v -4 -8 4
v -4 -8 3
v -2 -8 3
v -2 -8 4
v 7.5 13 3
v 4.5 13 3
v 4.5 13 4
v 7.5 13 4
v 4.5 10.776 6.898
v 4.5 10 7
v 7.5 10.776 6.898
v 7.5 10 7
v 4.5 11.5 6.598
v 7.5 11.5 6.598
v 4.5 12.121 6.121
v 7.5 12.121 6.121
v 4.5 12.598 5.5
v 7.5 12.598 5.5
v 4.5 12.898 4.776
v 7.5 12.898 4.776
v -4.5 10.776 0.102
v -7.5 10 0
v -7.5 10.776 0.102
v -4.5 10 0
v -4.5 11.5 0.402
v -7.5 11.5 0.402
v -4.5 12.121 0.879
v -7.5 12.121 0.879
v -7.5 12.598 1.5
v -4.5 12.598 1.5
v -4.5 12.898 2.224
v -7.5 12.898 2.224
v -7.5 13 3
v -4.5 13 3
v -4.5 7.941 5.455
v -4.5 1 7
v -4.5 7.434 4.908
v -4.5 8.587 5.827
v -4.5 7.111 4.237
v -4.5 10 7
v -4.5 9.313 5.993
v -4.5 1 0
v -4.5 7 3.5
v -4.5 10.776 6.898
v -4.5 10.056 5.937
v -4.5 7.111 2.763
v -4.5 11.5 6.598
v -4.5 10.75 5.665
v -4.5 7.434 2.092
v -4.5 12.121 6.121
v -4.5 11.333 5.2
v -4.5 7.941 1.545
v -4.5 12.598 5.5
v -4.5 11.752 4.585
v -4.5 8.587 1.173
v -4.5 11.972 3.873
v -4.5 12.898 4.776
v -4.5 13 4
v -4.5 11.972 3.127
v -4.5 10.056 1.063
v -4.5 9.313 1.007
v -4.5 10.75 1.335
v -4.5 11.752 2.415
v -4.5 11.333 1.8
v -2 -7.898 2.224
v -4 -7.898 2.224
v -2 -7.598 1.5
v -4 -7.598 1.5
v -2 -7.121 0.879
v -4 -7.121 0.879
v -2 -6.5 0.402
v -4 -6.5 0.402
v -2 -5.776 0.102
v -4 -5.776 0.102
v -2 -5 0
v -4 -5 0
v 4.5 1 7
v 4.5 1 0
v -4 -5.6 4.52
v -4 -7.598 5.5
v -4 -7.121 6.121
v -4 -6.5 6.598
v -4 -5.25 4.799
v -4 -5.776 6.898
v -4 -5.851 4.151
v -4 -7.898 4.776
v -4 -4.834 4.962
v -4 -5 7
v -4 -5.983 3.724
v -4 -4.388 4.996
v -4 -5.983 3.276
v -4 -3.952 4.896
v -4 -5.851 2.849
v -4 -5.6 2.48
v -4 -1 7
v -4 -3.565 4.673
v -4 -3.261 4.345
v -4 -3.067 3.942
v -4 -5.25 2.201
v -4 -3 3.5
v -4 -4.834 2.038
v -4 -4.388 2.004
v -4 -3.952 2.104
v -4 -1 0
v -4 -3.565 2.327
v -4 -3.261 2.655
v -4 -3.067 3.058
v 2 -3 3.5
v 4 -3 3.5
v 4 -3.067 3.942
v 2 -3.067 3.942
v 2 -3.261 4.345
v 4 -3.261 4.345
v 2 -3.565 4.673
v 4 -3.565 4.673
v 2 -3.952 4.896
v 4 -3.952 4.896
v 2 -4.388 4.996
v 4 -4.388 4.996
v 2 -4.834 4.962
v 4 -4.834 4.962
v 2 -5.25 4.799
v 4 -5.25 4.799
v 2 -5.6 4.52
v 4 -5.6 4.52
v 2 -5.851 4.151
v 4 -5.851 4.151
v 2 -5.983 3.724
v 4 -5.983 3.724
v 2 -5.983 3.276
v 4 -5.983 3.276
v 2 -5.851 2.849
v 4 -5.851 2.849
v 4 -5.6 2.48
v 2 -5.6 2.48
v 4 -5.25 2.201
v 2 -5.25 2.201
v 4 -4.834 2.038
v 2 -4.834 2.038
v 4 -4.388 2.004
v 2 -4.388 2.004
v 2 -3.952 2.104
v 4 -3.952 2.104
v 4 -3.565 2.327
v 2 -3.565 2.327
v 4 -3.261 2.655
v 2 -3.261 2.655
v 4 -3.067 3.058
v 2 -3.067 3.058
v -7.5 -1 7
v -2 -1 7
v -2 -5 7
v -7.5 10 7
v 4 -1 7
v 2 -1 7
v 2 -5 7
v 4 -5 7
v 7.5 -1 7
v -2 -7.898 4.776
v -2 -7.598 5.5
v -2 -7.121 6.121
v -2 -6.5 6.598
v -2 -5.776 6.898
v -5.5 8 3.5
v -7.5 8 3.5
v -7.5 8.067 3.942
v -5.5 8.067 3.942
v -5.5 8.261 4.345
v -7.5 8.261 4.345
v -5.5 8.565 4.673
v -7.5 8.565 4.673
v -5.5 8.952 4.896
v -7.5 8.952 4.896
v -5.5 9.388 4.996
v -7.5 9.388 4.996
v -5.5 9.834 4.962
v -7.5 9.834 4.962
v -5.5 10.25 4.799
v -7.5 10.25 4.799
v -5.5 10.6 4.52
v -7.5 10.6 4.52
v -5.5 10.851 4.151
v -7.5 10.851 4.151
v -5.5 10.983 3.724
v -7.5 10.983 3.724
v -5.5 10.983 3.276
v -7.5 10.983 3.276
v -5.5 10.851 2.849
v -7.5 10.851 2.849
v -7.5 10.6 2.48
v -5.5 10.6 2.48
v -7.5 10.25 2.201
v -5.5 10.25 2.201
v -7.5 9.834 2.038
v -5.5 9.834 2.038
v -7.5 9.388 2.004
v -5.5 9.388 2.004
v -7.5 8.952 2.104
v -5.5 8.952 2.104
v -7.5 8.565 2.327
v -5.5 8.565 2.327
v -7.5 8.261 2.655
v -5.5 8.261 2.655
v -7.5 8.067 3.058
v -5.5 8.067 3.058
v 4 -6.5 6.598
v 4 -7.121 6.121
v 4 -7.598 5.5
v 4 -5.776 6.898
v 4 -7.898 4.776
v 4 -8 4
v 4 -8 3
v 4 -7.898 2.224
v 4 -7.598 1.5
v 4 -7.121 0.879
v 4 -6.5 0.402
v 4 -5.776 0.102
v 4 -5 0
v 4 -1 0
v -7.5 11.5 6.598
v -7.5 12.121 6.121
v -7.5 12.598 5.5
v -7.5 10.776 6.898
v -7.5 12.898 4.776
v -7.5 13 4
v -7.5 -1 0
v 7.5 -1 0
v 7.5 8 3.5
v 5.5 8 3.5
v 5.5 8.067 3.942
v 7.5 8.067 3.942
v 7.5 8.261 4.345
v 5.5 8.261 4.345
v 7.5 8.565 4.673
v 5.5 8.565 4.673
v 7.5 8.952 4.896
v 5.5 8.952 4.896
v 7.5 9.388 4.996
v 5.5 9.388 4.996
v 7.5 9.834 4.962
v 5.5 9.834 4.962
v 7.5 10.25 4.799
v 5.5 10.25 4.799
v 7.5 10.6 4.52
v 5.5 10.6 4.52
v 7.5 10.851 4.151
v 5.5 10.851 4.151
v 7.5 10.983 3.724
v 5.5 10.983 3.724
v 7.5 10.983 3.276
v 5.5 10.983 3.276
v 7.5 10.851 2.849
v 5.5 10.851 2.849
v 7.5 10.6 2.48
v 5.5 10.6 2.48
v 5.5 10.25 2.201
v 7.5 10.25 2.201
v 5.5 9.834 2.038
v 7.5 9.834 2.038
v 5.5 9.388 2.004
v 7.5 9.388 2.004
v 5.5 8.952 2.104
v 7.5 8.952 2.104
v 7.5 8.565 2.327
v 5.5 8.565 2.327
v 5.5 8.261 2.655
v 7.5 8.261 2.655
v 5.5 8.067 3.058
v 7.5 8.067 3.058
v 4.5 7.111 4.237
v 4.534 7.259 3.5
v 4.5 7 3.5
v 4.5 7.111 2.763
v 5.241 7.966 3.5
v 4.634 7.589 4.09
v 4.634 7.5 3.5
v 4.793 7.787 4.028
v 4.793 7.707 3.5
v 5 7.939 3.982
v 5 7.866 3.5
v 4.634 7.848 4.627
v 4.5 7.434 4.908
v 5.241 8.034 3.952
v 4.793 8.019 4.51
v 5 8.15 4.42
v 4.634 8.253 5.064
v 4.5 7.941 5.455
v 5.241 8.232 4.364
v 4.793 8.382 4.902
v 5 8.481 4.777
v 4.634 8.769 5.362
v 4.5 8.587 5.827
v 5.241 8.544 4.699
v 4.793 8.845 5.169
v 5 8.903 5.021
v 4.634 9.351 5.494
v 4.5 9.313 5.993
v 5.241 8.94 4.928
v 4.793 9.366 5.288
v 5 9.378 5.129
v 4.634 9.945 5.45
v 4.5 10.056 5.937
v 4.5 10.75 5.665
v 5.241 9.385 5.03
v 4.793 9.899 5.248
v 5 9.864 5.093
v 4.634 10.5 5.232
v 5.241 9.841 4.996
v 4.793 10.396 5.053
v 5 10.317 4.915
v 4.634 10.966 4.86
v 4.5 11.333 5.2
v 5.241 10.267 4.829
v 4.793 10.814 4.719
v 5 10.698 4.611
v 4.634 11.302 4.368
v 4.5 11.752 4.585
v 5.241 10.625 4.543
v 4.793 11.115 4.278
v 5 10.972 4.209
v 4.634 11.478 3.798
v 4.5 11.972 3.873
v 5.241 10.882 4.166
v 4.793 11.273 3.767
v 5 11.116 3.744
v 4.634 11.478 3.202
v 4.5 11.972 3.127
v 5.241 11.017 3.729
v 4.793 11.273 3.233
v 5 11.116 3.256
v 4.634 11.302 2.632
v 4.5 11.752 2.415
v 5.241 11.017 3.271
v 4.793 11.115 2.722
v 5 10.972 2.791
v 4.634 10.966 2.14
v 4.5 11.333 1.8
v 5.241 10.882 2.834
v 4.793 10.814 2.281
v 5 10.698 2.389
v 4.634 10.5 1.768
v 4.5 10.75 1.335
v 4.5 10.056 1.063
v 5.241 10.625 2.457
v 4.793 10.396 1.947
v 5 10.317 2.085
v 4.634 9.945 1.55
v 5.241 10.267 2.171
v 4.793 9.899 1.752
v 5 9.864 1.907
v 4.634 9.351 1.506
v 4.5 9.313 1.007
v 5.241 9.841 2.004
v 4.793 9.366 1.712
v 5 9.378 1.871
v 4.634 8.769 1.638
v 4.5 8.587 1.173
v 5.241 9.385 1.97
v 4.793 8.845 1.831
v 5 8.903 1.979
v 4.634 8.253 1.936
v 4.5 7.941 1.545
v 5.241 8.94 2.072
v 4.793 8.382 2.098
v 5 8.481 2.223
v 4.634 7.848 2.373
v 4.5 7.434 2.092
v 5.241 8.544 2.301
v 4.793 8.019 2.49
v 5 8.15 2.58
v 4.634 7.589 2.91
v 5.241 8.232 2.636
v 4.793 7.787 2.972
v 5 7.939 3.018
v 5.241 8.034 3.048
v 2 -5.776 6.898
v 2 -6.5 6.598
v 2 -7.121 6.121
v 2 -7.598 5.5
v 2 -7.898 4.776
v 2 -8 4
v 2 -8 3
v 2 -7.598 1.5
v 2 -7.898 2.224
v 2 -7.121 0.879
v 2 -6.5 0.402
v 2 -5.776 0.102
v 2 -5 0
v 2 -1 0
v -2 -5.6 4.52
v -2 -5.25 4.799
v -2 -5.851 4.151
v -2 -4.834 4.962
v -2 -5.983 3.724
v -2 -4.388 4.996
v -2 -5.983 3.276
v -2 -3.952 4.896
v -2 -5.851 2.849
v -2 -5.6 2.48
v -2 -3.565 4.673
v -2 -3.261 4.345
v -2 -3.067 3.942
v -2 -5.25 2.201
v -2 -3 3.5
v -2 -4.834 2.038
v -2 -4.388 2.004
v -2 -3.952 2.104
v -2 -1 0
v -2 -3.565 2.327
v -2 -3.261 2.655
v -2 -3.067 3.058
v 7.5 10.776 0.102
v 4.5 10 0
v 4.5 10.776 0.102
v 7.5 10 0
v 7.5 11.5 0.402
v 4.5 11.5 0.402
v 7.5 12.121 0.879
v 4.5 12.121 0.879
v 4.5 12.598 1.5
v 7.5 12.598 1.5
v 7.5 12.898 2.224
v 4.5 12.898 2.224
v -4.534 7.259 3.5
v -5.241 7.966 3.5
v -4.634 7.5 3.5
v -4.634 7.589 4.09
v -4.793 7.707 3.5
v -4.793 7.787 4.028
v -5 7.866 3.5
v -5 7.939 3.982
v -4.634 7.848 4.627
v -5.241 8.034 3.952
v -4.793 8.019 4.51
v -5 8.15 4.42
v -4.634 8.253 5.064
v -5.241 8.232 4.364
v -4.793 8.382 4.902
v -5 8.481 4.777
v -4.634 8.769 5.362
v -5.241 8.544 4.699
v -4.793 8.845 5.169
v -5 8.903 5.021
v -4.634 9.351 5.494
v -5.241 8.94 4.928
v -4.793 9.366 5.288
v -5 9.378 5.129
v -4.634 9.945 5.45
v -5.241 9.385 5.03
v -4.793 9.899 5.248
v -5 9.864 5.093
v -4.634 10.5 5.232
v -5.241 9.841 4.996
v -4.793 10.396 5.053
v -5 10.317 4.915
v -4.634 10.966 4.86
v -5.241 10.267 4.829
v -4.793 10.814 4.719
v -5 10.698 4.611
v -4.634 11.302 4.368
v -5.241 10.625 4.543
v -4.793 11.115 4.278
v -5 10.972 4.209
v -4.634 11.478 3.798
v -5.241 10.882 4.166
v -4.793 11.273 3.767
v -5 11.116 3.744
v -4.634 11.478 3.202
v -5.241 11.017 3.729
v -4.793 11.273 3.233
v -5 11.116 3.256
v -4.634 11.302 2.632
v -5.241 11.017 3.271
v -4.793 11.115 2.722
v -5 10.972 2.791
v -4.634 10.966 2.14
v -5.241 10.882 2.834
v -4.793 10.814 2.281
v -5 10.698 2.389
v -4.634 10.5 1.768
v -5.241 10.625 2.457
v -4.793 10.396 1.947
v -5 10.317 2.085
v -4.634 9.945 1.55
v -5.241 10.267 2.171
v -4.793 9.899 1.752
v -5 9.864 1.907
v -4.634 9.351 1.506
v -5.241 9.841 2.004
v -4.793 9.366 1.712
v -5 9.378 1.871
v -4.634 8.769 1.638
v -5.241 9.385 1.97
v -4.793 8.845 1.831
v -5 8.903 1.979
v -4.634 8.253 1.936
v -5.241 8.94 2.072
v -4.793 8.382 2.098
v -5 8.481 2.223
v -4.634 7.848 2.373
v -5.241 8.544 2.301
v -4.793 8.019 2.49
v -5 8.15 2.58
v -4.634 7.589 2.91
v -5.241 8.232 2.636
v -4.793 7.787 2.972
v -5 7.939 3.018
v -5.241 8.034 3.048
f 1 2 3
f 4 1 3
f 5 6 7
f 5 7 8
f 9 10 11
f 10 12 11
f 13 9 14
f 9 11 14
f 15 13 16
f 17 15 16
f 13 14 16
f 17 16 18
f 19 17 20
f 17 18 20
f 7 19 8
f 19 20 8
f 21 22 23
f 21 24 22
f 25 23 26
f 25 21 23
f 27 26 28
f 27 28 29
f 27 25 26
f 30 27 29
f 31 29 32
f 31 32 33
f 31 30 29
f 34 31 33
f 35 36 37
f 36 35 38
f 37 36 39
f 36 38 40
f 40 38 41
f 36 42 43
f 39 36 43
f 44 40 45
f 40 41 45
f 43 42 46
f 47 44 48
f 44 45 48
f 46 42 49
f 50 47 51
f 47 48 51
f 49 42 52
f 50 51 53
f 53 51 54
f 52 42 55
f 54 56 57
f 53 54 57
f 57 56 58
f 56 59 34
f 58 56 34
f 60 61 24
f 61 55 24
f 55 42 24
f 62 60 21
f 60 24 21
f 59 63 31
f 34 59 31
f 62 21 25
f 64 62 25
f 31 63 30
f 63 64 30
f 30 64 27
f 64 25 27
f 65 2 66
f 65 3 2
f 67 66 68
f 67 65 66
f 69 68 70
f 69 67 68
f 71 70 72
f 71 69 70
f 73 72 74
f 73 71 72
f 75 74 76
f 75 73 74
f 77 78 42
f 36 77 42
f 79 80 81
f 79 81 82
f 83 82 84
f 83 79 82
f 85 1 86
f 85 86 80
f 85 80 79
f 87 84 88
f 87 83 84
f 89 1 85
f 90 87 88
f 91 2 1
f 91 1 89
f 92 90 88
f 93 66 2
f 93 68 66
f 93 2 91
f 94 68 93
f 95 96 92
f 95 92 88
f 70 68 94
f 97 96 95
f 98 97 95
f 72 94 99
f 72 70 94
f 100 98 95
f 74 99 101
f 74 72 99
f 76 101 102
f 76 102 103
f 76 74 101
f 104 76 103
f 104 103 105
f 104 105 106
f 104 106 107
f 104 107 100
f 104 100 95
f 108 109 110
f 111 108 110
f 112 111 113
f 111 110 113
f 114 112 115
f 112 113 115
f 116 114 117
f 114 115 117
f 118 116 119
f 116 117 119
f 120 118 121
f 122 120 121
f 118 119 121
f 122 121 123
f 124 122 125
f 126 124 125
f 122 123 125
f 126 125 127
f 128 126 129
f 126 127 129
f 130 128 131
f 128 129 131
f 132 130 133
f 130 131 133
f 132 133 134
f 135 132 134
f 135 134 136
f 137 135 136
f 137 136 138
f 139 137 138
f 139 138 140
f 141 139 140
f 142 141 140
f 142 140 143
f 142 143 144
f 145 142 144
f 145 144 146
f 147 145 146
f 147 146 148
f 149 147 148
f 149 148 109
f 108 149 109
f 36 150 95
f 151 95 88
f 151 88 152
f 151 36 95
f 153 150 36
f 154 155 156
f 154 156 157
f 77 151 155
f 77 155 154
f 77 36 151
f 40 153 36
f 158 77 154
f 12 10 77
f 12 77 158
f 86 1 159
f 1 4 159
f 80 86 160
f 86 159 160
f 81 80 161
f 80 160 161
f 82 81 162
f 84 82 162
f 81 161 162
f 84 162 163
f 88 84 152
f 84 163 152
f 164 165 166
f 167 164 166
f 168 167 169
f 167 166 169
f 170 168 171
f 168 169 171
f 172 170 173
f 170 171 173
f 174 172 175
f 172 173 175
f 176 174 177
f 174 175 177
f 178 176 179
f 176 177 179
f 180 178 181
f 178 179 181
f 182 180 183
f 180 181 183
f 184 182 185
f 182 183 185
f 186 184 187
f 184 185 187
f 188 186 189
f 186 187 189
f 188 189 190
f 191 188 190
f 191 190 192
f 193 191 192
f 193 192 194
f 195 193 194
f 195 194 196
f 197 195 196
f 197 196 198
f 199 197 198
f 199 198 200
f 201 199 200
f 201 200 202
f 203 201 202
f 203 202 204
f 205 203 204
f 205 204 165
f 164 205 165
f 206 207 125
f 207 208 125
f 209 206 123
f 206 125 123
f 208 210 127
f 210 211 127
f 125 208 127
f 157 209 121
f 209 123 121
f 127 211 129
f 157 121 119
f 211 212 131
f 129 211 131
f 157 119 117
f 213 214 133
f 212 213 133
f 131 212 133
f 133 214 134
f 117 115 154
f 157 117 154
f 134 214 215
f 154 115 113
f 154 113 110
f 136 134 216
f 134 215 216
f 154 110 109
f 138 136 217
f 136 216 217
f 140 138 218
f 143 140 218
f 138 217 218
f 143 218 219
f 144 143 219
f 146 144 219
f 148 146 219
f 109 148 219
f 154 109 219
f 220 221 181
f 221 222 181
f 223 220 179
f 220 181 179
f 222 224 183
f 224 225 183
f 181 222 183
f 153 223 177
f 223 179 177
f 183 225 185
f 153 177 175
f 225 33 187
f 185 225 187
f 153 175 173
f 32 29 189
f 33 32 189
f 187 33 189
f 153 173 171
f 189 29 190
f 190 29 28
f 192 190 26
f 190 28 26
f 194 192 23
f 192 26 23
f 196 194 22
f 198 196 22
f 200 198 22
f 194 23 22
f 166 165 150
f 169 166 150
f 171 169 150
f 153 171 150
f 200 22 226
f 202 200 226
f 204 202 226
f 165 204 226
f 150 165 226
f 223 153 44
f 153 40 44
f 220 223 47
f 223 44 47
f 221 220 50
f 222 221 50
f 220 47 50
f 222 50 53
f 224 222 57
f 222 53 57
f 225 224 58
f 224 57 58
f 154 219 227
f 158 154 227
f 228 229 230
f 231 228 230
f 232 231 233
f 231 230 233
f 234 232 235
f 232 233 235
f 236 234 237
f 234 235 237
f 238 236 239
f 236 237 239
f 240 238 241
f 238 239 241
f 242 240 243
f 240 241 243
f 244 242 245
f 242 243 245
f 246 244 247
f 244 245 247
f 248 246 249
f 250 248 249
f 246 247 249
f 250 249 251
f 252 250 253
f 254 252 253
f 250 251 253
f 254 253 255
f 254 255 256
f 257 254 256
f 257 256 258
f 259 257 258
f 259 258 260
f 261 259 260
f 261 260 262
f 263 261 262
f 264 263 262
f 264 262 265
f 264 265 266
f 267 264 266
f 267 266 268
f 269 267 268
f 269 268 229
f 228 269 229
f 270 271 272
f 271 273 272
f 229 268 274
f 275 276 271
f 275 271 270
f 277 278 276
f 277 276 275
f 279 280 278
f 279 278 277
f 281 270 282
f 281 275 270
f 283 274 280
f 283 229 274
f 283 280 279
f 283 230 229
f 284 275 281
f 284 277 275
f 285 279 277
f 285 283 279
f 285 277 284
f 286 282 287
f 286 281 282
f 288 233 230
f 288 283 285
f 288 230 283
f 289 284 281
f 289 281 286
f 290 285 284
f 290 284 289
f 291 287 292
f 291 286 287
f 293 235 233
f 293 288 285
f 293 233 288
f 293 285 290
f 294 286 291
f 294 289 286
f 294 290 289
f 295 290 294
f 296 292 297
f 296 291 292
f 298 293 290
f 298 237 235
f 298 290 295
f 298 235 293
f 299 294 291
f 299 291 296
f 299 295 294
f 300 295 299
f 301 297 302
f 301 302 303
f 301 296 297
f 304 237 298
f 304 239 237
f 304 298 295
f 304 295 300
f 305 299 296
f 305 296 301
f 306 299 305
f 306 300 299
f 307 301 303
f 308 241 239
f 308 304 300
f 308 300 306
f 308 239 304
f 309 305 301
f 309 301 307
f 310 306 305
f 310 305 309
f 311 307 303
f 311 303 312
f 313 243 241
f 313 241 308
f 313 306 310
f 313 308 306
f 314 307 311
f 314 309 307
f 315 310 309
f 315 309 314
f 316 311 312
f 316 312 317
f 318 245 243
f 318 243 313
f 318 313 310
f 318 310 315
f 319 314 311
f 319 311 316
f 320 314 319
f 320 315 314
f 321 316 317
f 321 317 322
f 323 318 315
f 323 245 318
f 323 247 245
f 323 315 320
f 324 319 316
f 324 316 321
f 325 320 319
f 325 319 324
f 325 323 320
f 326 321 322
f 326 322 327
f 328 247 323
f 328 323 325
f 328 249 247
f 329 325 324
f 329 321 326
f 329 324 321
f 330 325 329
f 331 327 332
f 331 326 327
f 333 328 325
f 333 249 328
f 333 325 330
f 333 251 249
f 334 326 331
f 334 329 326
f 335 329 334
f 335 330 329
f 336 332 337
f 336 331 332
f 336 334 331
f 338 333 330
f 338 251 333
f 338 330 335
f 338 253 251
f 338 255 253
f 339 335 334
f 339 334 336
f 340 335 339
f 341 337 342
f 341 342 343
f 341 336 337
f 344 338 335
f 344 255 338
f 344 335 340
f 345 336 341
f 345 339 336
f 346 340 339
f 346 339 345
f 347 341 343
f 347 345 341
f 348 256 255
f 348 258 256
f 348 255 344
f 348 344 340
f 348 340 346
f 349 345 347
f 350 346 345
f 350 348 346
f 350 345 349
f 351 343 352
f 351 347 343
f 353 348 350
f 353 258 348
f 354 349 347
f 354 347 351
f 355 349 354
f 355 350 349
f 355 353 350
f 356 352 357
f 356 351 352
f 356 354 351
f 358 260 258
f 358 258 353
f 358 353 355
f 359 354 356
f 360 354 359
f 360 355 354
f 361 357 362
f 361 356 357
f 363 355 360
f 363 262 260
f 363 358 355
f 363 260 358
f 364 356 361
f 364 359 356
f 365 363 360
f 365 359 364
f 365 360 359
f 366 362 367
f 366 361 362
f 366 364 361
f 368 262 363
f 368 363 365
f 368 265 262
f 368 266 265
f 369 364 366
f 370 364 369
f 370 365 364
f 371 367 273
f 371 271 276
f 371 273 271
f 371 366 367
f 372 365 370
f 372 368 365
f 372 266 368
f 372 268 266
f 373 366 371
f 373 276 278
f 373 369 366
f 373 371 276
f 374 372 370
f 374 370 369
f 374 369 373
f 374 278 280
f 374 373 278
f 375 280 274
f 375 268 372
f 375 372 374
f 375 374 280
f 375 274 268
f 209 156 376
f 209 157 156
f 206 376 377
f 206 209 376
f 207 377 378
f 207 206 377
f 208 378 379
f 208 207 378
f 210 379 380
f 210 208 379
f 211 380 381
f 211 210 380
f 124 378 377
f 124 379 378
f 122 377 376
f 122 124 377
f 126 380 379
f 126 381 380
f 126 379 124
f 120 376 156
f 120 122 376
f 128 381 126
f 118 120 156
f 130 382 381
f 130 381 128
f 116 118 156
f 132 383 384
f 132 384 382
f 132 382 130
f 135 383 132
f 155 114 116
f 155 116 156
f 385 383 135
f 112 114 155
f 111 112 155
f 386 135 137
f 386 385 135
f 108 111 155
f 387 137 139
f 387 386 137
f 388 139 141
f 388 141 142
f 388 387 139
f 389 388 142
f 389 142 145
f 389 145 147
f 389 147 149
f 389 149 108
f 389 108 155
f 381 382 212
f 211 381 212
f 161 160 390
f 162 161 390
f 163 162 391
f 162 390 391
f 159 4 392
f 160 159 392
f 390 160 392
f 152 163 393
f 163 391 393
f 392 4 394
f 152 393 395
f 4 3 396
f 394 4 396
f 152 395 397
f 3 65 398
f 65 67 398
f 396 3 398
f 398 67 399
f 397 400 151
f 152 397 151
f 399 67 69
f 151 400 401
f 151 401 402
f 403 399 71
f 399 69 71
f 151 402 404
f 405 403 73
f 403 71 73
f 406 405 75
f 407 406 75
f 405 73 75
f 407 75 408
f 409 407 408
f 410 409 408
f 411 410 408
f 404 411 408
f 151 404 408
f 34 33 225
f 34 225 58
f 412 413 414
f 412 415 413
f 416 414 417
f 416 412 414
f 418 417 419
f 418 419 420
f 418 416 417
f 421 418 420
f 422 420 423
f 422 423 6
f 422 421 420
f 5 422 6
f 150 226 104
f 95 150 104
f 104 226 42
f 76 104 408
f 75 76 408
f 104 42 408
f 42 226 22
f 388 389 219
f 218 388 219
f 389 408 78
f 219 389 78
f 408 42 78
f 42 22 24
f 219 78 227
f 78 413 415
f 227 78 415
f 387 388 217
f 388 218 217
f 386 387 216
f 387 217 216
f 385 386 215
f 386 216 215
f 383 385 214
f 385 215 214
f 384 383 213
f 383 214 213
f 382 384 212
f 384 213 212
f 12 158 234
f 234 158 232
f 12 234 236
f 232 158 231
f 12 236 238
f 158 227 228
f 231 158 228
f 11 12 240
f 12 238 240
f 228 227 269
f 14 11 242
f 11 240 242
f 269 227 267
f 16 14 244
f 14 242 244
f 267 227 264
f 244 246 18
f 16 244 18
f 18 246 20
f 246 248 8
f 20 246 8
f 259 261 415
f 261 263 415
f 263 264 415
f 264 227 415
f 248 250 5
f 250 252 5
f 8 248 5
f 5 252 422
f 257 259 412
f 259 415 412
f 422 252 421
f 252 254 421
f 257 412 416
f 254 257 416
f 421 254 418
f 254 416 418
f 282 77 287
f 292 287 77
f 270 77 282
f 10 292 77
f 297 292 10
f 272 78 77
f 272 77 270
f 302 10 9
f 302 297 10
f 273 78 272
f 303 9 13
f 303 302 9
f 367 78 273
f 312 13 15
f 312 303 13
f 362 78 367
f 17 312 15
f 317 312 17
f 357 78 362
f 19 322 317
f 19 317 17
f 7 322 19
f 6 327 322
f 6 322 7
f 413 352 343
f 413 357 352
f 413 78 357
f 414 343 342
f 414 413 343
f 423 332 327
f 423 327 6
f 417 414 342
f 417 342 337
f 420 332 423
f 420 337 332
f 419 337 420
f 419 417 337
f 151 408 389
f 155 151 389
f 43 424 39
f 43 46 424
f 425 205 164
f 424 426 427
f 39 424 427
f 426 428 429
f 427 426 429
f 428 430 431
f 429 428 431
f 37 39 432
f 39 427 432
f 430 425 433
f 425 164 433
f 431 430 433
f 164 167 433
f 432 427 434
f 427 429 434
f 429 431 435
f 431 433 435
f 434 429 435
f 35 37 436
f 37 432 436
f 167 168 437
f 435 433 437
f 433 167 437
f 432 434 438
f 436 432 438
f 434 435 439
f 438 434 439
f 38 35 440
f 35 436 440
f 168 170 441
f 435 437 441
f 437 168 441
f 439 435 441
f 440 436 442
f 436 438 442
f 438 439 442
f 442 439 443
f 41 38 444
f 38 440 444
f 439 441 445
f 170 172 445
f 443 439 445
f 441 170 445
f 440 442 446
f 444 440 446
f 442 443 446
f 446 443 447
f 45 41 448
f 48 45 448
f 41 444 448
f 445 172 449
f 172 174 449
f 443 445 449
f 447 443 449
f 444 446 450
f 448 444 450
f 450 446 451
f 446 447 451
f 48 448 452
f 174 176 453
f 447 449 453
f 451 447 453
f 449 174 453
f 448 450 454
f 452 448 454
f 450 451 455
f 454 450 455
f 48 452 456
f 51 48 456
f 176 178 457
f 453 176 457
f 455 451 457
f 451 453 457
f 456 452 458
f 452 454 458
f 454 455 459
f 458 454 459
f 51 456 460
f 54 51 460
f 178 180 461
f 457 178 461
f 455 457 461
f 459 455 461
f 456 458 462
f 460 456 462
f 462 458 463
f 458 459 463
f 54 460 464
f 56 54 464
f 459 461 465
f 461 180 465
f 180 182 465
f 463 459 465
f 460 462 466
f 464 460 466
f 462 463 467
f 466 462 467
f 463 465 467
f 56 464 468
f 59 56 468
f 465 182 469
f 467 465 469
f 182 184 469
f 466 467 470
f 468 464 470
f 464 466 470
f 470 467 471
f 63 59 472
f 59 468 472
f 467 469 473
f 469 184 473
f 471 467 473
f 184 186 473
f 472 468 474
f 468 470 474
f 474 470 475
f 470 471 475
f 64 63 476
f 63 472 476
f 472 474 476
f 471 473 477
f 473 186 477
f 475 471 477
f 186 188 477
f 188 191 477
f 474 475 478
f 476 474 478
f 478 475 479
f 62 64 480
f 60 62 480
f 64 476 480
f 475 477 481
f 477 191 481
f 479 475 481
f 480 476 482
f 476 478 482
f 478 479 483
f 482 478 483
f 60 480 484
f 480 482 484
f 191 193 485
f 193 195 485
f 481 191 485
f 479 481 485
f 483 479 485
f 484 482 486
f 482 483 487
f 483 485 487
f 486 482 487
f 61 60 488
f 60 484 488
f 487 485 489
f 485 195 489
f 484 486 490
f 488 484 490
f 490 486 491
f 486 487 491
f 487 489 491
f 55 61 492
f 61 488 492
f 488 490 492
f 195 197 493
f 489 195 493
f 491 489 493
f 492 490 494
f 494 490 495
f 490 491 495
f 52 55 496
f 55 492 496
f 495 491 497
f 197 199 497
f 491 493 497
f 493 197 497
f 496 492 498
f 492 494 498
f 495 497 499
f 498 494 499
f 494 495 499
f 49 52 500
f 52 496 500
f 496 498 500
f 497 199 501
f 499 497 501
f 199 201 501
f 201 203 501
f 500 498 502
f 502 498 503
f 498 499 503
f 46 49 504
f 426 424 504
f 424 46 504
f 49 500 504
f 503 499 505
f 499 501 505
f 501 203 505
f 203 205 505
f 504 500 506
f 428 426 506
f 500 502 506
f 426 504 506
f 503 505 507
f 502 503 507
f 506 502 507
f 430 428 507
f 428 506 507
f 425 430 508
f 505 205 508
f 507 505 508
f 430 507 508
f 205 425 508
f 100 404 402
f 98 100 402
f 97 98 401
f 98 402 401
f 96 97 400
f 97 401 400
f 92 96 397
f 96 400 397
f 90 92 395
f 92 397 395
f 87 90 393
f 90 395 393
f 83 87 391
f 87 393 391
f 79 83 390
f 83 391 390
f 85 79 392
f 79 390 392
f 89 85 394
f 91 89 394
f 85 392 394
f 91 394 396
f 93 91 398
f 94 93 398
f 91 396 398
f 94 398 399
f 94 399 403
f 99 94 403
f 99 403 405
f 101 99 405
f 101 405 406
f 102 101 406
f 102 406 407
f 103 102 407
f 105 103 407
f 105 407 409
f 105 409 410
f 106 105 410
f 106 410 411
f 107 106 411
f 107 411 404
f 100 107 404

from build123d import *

# Parameters (mm, degrees)
F0_W     = 2
F0_H     = 7
F0_W_2   = 3
F0_H_2   = 12
F1_DEPTH = 7
F2_R     = 1.5
F3_DEPTH = 12
F4_R     = 3
F5_R     = 1.5
F6_DEPTH = 25
F7_R     = 1


with BuildPart() as f1:
    # F0 (on Top) → F1 (new body)
    with BuildSketch(Plane.XY):
        with Locations((-3, -4.5)):
            Rectangle(F0_W, F0_H)
        with Locations((-6, 7)):
            Rectangle(F0_W_2, F0_H_2)
        with Locations((6, 7)):
            Rectangle(F0_W_2, F0_H_2)
        Polygon((4, -1), (7.5, -1), (7.5, 1), (4.5, 1), (-4.5, 1), (-7.5, 1), (-7.5, -1), (-4, -1), (-2, -1), (2, -1), align=None)
        with Locations((3, -4.5)):
            Rectangle(F0_W, F0_H)
    extrude(amount=F1_DEPTH)

    # F2 (on face) → F3 (cut)
    with BuildSketch(Plane.YZ.offset(4)):
        with Locations((-4.5, 3.5)):
            Circle(F2_R)
    extrude(amount=-F3_DEPTH, mode=Mode.SUBTRACT)

    # F4
    f4_edges = [f1.edges().sort_by_distance(p)[0] for p in [
        (-3, -8, 0),
        (3, -8, 0),
        (3, -8, 7),
        (-3, -8, 7),
        (-6, 13, 0),
        (6, 13, 0),
        (-6, 13, 7),
        (6, 13, 7),
    ]]
    fillet(f4_edges, radius=F4_R)

    # F5 (on face) → F6 (cut)
    with BuildSketch(Plane(origin=(-7.5, 0, 0), x_dir=(0, -1, 0), z_dir=(-1, 0, 0))):
        with Locations((-9.5, 3.5)):
            Circle(F5_R)
    extrude(amount=-F6_DEPTH, mode=Mode.SUBTRACT)

    # F7
    f7_edges = [f1.edges().sort_by_distance(p)[0] for p in [
        (4.5, 11, 3.5),
        (-4.5, 11, 3.5),
    ]]
    fillet(f7_edges, radius=F7_R)


solid = f1.part
